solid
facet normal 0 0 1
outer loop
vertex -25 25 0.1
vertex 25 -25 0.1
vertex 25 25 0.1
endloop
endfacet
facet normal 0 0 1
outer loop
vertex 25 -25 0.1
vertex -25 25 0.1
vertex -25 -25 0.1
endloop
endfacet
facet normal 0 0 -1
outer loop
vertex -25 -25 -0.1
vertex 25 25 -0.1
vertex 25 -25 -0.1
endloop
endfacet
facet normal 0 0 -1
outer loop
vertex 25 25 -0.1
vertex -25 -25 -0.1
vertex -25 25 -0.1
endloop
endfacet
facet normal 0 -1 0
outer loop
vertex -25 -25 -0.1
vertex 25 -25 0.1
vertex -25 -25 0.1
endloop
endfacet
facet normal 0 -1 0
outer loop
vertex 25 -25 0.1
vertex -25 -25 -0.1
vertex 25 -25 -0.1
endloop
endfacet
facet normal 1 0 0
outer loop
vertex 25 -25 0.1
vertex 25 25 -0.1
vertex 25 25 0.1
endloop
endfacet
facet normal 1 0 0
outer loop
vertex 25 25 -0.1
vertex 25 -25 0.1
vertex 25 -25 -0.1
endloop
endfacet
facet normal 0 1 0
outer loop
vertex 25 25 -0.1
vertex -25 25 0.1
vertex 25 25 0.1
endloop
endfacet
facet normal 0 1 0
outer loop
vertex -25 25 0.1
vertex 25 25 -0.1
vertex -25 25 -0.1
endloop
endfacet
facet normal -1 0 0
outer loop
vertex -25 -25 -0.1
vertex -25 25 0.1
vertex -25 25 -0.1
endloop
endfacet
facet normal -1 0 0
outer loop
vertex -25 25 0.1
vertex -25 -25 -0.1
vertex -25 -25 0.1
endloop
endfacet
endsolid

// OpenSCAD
layerHeight = 0.2;
length = 50;

// rotate([0, 0, 45]) {
    cube([length, length, layerHeight], center = true);
// }
